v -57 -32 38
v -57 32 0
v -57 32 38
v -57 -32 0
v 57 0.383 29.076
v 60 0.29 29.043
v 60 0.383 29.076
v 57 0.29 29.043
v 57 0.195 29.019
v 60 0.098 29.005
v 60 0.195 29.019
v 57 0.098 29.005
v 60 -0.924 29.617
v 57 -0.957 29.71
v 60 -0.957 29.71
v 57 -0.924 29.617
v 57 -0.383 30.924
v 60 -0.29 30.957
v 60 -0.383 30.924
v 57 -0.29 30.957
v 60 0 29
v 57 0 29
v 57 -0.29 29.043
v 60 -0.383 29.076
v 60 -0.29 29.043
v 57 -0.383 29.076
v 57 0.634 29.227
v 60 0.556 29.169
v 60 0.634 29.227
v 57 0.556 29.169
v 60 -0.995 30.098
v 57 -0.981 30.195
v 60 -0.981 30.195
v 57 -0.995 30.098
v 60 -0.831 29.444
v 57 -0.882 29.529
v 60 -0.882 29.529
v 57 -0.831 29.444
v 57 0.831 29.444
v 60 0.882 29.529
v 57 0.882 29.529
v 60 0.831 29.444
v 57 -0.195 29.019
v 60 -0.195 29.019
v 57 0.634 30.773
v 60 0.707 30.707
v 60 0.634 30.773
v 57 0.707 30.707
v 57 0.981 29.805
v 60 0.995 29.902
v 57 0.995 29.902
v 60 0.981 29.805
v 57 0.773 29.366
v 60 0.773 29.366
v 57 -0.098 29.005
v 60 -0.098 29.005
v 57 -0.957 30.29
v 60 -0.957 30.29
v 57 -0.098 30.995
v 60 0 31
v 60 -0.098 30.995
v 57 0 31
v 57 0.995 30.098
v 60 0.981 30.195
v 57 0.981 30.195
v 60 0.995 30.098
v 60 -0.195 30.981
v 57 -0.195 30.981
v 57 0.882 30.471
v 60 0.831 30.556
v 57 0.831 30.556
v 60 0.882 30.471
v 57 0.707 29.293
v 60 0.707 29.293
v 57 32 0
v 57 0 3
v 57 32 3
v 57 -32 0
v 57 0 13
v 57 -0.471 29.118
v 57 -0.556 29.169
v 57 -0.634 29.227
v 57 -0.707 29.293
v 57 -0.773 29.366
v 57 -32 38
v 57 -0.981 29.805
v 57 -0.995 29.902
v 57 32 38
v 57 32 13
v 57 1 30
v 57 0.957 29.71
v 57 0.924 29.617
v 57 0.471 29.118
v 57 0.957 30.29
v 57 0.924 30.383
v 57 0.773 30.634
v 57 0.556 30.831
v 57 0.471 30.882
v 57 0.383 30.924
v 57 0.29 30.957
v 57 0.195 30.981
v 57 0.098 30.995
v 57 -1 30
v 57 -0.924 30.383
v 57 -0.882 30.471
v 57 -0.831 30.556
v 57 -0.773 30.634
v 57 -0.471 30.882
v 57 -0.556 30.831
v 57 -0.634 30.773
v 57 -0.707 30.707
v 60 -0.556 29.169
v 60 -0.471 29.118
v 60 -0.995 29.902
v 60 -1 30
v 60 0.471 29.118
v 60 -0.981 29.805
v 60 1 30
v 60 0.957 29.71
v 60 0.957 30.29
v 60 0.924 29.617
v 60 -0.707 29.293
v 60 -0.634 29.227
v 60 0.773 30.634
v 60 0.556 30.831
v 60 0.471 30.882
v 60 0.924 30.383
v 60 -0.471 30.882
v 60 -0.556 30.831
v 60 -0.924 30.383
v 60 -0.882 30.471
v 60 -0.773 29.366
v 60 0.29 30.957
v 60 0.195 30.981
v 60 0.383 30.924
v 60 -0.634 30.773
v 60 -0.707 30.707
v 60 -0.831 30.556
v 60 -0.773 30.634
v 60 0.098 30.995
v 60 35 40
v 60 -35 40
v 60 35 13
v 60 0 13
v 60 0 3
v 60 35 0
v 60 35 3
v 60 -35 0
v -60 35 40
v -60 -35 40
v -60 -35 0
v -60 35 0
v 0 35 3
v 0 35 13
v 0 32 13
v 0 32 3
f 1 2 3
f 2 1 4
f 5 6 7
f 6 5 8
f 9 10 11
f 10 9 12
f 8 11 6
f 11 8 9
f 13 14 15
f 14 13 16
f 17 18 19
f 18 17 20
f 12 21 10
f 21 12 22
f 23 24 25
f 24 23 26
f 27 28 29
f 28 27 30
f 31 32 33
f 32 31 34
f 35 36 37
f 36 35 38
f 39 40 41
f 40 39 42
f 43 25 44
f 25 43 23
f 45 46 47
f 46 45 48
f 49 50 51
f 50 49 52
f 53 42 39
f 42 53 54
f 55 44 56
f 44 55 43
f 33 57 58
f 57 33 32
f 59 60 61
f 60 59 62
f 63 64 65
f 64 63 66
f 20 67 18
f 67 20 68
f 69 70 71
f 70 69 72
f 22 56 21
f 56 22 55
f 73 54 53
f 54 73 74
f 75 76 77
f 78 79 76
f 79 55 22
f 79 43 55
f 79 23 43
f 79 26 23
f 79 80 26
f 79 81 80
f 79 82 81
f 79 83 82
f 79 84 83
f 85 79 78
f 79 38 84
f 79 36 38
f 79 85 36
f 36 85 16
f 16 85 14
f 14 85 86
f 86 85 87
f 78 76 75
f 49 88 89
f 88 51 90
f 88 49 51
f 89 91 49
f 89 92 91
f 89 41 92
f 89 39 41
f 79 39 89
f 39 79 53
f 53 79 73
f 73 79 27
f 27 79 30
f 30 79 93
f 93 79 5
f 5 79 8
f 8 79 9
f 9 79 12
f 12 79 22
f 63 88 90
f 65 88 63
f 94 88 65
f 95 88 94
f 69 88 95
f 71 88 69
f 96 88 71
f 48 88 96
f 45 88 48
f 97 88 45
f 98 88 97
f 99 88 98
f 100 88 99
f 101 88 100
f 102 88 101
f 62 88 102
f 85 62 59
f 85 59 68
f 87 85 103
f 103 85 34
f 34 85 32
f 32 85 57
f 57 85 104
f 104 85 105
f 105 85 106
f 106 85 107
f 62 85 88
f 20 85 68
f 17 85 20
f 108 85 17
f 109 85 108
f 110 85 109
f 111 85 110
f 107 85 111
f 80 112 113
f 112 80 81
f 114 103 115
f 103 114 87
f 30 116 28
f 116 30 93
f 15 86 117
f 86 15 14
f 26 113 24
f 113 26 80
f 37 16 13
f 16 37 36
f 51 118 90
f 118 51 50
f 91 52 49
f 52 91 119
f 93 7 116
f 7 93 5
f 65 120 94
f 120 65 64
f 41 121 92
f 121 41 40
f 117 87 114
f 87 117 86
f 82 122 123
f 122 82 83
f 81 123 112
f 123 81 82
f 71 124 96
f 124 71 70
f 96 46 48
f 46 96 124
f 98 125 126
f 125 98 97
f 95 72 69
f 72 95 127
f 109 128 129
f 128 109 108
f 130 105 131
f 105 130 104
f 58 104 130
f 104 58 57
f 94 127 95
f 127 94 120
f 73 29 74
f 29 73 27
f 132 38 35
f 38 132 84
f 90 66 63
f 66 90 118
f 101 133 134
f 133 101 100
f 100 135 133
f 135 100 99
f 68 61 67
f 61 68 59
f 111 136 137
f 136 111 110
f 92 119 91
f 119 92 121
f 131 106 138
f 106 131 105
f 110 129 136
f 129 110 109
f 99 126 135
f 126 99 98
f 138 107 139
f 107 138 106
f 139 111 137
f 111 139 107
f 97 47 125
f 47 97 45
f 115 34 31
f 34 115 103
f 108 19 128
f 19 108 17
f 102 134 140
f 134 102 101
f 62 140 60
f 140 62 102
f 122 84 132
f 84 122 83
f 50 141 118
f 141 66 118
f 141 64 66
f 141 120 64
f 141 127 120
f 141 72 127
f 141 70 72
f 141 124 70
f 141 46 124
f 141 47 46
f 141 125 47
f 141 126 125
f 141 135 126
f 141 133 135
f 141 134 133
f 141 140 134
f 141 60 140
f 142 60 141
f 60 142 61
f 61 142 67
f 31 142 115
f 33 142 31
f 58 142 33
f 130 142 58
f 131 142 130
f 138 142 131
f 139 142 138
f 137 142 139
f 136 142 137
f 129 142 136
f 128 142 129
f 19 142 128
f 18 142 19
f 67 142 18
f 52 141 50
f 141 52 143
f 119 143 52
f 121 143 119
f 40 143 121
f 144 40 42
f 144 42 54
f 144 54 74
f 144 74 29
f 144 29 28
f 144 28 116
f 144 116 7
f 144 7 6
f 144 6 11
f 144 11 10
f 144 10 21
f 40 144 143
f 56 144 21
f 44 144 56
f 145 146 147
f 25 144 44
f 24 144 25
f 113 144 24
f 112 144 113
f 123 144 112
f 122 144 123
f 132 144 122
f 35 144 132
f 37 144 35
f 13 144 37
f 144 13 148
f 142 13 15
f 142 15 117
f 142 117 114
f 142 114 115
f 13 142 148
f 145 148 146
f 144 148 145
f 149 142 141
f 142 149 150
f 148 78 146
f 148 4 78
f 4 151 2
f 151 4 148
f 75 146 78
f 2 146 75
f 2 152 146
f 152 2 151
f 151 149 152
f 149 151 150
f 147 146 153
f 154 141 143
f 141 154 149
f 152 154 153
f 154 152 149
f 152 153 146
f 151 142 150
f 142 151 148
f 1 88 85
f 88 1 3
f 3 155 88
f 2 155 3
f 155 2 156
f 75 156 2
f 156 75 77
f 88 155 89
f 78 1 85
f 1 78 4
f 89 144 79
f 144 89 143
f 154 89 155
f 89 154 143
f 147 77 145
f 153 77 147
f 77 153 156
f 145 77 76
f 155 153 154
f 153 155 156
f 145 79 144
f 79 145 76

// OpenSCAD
// Buffer tank for a mini horizontal gel-electrophoresis box
// Print orientation: rests on XY plane at z = 0, builds upward (+Z), centred on origin in X and Y.

// ---- Tank outer dimensions (measured with calipers) ----
L = 120;   // outer length along X
W = 70;    // outer width  along Y
H = 40;    // outer height along Z

// ---- Wall / floor thickness ----
t = 3;     // uniform wall and floor thickness

// ---- Inner cavity dimensions ----
Li = L - 2*t;   // inner length  = 114
Wi = W - 2*t;   // inner width   = 64
Hi = H - t;     // inner height  = 37  (open top)

// ---- Raised gel-tray platform ----
pl = 60;    // platform length along X (centred)
pt = 10;    // platform height above the inner floor (top at z = 13)

// ---- Electrode-wire holes (through the two X end walls) ----
hr = 1;     // hole radius (2 mm diameter)
hz = 30;    // hole centre height above z = 0

$fn = 64;   // round holes / curved faces

// ---- Build the tank ----
// 1. Outer solid block
// 2. Subtract the open-top inner cavity (extended 1 mm past the top so the rim is open)
// 3. Union the solid raised platform (sits on the inner floor, spans full inner width)
// 4. Subtract the two horizontal electrode holes (extended 1 mm past each end wall)
difference() {
    // 1. Outer block
    translate([-L/2, -W/2, 0])
        cube([L, W, H]);

    // 2. Inner cavity (open top)
    translate([-(L/2 - t), -(W/2 - t), 0])
        cube([Li, Wi, Hi + 1]);

    // 3. Raised gel-tray platform
    translate([0, 0, t])
        cube([pl, Wi, pt]);

    // 4. Electrode holes through the two X end walls
    for (sx = [-1, 1]) {
        translate([sx * (L/2 - t), 0, hz])
            rotate([0, 90, 0])
                cylinder(h = t + 2, r = hr, $fn = 64);
    }
}
